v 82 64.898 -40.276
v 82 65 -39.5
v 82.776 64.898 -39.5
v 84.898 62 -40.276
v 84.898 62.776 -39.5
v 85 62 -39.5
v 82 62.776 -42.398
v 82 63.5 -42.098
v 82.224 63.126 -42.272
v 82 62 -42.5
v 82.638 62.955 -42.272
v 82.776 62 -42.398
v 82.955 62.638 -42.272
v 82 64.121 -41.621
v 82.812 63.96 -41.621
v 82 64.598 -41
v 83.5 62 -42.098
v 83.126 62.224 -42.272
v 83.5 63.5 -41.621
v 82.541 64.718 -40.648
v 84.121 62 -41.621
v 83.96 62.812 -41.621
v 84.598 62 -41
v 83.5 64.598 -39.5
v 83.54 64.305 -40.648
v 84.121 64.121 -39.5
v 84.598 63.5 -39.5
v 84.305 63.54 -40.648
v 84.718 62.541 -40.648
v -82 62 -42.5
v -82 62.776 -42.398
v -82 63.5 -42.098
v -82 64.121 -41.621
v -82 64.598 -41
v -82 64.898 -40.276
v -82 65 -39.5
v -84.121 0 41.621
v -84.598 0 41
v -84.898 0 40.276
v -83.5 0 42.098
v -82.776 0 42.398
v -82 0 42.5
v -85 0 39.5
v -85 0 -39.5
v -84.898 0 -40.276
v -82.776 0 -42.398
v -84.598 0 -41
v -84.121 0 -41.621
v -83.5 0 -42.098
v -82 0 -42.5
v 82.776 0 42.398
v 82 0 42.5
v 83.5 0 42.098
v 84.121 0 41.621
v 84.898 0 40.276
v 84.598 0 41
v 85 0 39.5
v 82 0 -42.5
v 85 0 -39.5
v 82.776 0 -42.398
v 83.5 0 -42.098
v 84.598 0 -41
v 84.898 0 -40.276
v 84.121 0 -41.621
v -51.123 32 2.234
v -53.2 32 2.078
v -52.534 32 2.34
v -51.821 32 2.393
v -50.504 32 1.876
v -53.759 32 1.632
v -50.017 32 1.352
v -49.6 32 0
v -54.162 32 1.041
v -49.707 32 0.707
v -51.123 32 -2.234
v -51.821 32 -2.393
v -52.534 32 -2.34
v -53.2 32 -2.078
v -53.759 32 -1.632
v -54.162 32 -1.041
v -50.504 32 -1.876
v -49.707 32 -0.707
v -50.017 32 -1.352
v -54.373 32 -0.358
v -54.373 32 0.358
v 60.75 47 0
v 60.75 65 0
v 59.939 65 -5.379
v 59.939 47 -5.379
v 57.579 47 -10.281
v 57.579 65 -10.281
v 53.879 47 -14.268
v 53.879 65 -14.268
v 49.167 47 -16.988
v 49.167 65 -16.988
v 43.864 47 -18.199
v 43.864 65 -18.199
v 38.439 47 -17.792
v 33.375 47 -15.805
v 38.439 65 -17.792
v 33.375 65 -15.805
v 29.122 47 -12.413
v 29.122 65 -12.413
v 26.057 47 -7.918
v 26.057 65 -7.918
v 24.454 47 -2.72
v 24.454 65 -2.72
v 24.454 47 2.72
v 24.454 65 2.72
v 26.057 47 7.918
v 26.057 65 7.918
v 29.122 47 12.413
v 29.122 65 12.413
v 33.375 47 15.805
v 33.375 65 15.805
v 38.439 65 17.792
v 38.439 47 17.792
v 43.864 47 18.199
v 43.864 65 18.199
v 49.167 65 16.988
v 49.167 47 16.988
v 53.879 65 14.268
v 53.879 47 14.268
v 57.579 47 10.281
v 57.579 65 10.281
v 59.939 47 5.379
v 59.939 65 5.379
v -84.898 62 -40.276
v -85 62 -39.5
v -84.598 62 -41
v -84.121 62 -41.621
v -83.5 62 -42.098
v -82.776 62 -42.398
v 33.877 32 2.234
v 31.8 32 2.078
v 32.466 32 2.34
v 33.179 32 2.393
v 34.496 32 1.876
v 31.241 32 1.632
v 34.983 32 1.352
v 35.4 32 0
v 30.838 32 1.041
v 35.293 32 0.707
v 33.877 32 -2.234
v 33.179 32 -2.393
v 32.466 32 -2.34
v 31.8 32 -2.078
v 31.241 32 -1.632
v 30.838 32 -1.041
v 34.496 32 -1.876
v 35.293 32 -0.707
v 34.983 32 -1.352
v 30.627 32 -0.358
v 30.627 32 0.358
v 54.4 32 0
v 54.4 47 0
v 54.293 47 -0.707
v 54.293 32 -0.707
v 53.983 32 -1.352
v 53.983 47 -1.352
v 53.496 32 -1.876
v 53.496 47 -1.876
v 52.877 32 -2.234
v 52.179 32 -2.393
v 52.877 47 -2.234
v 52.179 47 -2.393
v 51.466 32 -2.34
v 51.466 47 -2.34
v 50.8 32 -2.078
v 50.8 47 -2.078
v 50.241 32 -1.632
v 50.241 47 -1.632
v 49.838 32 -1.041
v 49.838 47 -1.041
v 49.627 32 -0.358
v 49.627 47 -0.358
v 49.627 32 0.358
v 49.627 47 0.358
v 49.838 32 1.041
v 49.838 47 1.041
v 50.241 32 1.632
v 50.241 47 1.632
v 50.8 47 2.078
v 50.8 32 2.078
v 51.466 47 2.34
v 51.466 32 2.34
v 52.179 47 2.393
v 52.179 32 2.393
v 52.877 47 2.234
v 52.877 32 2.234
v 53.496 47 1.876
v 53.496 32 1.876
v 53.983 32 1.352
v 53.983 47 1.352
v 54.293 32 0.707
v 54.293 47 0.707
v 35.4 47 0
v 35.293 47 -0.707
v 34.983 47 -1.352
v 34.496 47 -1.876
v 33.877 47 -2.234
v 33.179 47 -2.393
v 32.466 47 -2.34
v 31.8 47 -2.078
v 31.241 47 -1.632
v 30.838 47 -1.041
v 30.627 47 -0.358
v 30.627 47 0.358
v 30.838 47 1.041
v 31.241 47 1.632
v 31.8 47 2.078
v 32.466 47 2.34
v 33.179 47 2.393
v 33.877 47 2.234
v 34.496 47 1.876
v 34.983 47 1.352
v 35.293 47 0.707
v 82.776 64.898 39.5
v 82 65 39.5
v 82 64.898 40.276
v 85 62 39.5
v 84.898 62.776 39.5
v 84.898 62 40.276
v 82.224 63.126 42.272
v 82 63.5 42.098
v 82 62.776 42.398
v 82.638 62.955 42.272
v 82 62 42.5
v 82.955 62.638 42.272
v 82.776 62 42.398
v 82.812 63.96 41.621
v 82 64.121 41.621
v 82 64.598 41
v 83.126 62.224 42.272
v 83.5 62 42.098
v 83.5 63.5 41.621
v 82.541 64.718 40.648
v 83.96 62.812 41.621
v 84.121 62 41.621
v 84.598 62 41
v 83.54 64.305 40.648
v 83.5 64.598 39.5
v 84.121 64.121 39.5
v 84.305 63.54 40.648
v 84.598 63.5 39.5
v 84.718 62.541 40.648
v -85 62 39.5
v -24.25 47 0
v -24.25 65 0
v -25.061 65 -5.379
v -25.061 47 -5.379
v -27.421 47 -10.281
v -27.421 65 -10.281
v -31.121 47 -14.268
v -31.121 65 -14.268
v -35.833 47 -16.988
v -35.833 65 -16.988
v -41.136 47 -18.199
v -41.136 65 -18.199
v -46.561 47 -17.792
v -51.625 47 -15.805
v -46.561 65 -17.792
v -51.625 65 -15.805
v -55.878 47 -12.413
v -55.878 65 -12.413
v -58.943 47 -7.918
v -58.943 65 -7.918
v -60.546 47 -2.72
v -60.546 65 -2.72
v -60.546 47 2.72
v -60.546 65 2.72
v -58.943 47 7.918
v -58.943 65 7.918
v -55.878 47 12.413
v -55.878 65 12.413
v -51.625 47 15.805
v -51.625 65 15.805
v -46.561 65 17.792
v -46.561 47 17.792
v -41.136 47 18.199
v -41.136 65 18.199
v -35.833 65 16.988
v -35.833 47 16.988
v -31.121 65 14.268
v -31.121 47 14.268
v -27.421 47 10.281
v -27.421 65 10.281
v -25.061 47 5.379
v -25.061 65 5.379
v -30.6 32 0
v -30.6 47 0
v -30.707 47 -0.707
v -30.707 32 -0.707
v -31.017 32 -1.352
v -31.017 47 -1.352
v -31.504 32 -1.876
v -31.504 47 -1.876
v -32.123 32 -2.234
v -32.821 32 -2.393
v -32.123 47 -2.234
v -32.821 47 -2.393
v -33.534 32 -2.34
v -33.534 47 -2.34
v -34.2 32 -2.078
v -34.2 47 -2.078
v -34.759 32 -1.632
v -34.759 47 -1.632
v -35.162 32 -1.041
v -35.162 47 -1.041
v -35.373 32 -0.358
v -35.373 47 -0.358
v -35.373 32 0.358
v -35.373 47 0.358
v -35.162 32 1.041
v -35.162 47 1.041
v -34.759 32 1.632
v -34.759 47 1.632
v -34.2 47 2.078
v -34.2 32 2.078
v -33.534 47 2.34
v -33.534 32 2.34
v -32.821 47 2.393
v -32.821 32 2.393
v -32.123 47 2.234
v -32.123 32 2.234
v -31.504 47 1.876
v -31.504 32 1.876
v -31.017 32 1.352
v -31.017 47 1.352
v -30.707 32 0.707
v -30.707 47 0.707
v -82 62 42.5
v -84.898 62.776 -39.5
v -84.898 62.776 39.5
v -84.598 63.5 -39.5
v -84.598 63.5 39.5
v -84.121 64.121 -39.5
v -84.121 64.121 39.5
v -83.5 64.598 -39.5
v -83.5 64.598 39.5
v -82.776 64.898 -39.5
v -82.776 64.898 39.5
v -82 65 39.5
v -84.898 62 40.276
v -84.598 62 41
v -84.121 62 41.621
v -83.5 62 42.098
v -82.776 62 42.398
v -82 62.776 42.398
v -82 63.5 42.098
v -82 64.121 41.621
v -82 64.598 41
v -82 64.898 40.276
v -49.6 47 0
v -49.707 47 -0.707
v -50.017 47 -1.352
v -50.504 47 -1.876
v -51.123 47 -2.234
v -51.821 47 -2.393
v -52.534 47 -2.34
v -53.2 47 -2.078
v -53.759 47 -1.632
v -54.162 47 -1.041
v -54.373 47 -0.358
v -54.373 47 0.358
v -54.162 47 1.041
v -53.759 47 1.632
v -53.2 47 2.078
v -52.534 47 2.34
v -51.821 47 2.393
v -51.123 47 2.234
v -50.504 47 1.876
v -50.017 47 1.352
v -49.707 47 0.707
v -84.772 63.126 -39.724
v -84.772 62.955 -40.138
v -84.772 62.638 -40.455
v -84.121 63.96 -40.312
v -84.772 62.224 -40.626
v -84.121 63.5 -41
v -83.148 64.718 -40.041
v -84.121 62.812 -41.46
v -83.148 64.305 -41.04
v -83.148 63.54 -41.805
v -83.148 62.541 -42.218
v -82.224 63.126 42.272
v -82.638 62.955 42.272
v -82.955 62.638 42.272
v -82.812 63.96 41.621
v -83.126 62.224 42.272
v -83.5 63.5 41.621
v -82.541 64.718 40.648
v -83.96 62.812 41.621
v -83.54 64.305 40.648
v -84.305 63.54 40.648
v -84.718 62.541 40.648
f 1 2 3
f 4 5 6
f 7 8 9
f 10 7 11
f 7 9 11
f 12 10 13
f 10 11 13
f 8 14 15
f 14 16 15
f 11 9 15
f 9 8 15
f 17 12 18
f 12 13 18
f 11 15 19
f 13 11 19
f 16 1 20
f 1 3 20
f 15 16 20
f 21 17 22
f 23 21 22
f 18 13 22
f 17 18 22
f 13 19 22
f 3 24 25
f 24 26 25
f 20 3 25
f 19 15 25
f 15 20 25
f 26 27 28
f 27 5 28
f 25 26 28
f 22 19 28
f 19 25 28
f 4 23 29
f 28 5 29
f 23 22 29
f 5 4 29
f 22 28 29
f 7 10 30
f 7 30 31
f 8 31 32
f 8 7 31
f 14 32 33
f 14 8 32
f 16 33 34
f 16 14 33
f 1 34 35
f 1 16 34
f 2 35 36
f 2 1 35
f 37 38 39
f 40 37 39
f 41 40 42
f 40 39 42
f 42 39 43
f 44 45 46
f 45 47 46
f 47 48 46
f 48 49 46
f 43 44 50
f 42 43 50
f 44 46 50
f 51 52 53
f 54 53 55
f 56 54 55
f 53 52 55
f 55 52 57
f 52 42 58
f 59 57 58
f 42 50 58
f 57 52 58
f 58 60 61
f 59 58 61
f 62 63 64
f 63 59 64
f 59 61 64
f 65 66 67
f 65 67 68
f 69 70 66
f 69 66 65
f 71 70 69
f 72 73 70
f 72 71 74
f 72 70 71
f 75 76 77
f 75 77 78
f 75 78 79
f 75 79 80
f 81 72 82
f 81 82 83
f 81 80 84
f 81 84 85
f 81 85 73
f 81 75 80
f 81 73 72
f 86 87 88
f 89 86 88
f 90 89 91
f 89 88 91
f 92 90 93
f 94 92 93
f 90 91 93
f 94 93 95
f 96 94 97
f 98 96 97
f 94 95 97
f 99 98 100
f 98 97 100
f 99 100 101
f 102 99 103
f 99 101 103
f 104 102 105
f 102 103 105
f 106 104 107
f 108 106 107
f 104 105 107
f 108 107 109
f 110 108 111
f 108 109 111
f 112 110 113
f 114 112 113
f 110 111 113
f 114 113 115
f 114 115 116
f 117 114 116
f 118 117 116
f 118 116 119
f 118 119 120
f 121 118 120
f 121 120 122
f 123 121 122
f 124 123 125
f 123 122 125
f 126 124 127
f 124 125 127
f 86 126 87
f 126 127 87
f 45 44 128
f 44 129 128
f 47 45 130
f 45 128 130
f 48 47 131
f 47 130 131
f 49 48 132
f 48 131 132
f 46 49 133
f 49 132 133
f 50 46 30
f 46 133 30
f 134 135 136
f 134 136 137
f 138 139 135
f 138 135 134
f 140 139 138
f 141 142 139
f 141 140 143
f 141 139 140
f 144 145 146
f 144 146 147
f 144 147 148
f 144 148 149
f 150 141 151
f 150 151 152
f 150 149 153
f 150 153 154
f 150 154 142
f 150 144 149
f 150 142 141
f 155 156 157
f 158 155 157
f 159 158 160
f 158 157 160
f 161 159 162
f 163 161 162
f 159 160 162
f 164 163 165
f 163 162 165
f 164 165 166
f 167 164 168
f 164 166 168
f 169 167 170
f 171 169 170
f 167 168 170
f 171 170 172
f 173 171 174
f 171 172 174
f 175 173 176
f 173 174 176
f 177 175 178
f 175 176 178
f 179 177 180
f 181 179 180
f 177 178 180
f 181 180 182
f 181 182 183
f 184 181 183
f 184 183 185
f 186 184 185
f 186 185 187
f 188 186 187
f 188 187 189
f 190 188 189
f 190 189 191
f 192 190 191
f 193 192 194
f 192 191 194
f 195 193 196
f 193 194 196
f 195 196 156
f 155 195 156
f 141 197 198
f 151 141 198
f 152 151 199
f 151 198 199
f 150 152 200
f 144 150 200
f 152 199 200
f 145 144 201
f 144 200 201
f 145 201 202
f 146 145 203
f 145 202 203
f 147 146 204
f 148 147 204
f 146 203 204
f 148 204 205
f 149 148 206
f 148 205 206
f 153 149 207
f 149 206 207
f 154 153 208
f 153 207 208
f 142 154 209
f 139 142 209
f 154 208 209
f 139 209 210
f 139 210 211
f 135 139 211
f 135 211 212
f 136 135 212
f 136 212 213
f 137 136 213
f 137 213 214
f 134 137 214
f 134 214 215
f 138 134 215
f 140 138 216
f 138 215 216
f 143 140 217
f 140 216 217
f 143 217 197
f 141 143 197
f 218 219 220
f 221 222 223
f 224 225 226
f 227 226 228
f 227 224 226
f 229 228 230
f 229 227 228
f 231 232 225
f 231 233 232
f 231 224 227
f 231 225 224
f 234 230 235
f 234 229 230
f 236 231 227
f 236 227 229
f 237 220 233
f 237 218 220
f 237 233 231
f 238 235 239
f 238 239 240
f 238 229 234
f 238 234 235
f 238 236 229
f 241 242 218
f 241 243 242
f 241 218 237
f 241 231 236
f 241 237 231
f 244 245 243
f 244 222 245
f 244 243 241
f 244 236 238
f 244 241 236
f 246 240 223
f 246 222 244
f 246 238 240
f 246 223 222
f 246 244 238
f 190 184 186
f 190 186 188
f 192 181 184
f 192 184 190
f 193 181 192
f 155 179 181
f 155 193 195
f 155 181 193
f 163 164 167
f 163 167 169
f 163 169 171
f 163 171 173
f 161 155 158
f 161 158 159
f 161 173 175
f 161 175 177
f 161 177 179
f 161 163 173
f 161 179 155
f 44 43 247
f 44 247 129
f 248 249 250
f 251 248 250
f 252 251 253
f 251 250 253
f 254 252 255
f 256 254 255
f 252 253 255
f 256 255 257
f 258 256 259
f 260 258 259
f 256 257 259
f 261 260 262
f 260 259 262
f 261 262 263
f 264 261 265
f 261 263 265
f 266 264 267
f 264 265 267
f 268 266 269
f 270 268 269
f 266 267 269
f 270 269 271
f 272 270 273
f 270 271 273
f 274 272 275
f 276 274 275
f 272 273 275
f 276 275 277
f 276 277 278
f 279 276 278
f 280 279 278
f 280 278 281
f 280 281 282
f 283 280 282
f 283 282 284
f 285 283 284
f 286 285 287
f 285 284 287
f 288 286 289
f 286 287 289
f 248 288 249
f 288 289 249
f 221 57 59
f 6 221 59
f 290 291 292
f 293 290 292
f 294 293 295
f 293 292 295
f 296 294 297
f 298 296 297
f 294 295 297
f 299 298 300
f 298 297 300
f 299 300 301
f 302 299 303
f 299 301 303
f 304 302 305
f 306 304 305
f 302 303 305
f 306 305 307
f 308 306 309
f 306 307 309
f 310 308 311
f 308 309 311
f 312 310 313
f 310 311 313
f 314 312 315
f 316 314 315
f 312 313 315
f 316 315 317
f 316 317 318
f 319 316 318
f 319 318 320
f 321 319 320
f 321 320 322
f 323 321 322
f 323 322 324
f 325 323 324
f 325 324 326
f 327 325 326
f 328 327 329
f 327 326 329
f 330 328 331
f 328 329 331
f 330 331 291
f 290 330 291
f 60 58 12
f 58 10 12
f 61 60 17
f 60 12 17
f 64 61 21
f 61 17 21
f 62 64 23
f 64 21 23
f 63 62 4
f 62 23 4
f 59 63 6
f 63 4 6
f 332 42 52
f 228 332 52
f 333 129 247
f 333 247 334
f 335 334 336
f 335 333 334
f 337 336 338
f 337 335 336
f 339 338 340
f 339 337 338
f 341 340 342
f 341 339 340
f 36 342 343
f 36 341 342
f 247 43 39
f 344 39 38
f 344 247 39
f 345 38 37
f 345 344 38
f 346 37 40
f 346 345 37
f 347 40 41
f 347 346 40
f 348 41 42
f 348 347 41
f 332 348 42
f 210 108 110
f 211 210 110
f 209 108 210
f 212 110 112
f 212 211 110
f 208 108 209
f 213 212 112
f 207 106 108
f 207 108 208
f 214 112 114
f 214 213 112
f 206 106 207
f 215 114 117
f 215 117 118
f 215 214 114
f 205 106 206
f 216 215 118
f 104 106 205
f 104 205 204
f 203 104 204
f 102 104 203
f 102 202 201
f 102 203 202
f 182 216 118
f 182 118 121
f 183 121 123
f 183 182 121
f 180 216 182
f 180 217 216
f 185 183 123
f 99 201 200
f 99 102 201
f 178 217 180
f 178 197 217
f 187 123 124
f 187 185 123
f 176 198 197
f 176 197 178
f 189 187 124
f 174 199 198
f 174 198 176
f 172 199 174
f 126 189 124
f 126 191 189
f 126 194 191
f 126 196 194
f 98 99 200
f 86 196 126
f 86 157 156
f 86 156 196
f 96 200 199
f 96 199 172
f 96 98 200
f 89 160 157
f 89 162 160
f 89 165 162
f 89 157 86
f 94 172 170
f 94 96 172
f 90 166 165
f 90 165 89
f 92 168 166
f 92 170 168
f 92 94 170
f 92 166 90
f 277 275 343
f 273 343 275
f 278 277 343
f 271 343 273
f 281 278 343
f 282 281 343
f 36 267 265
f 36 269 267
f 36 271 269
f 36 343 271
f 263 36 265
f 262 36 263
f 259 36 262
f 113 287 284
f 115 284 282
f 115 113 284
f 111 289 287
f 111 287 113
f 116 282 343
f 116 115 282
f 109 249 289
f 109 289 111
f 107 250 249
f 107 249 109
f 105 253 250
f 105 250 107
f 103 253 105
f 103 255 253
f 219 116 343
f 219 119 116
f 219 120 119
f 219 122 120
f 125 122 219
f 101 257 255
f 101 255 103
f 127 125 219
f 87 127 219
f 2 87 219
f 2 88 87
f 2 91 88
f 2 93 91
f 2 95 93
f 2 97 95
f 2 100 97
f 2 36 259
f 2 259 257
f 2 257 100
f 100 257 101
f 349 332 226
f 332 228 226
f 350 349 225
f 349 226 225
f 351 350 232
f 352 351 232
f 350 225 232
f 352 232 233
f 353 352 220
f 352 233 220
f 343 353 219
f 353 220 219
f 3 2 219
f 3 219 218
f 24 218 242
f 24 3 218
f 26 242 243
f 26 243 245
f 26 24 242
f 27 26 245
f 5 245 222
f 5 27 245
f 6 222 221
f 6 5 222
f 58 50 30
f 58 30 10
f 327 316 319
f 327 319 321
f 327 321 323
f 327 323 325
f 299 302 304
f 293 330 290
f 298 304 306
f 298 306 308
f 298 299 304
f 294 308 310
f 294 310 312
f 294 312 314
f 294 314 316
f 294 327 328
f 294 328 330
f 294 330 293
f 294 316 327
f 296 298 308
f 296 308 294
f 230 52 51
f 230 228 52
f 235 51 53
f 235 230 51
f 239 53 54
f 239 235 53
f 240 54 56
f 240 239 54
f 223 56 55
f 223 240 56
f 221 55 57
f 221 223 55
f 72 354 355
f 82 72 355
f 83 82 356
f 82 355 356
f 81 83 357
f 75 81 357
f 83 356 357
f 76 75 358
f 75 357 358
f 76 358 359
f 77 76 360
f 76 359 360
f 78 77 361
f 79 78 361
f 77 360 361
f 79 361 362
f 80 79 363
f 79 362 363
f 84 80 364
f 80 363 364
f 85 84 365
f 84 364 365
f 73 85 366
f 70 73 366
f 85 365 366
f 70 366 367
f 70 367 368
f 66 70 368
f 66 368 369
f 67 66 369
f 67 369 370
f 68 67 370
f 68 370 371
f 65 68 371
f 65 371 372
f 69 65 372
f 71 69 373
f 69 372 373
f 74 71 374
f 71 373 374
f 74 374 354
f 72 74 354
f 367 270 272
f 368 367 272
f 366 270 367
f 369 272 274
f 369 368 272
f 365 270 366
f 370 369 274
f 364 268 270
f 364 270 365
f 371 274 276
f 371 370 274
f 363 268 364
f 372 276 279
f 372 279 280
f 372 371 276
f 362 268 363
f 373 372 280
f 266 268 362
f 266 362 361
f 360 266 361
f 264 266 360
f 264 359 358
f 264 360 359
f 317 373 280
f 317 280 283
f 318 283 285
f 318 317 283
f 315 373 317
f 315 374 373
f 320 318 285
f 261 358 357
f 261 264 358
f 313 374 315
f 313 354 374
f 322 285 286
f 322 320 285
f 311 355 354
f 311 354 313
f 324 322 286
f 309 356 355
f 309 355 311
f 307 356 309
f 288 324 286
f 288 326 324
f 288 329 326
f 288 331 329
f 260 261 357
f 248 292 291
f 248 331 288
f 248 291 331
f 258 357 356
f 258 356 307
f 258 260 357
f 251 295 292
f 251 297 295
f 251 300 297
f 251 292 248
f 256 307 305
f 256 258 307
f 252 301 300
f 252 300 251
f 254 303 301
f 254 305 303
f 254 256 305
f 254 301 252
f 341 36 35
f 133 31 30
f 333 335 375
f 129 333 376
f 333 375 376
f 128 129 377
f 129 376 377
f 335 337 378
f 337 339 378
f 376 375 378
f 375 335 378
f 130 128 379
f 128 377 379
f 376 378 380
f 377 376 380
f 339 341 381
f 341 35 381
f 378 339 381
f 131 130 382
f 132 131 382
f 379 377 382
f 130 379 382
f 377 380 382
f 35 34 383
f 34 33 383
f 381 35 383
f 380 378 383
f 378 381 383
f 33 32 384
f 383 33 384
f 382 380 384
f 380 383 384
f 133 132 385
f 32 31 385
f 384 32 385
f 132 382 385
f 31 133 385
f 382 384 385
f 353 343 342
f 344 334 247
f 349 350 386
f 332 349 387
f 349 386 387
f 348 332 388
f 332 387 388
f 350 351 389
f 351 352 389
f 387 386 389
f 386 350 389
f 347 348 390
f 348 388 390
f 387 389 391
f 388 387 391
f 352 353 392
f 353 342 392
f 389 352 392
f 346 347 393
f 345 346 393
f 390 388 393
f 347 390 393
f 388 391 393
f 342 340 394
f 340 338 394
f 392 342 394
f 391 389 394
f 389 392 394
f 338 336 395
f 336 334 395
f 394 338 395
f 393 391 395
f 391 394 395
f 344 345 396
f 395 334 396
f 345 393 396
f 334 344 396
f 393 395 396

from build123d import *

# Parameters (mm, degrees)
SKETCH_1_W          = 170
SKETCH_1_H          = 85
EXTRUDE_1_DEPTH     = 65
SKETCH_2_R          = 18.25
CUT_EXTRUDE_1_DEPTH = 18
SKETCH_3_R          = 2.4
CUT_EXTRUDE_2_DEPTH = 15
FILLET_1_R          = 3


with BuildPart() as part:
    # Эскиз1 → Бобышка-Вытянуть1 (new body)
    with BuildSketch(Plane(origin=(0, 0, 0), x_dir=(1, 0, 0), z_dir=(0, 1, 0))):
        Rectangle(SKETCH_1_W, SKETCH_1_H)
    extrude(amount=EXTRUDE_1_DEPTH)

    # Эскиз2 → Вырез-Вытянуть1 (cut)
    with BuildSketch(Plane(origin=(0, 65, 0), x_dir=(1, 0, 0), z_dir=(0, 1, 0))):
        with Locations((-42.5, 0)):
            Circle(SKETCH_2_R)
        with Locations((42.5, 0)):
            Circle(SKETCH_2_R)
    extrude(amount=-CUT_EXTRUDE_1_DEPTH, mode=Mode.SUBTRACT)

    # Эскиз3 → Вырез-Вытянуть2 (cut)
    with BuildSketch(Plane(origin=(0, 47, 0), x_dir=(1, 0, 0), z_dir=(0, 1, 0))):
        with Locations((-52, 0)):
            Circle(SKETCH_3_R)
        with Locations((-33, 0)):
            Circle(SKETCH_3_R)
        with Locations((33, 0)):
            Circle(SKETCH_3_R)
        with Locations((52, 0)):
            Circle(SKETCH_3_R)
    extrude(amount=-CUT_EXTRUDE_2_DEPTH, mode=Mode.SUBTRACT)

    # Скругление1
    fillet_1_edges = [part.edges().sort_by_distance(p)[0] for p in [
        (85, 65, 0),
        (0, 65, -42.5),
        (-85, 65, 0),
        (0, 65, 42.5),
        (-85, 32.5, -42.5),
        (85, 32.5, -42.5),
        (85, 32.5, 42.5),
        (-85, 32.5, 42.5),
    ]]
    fillet(fillet_1_edges, radius=FILLET_1_R)


solid = part.part
